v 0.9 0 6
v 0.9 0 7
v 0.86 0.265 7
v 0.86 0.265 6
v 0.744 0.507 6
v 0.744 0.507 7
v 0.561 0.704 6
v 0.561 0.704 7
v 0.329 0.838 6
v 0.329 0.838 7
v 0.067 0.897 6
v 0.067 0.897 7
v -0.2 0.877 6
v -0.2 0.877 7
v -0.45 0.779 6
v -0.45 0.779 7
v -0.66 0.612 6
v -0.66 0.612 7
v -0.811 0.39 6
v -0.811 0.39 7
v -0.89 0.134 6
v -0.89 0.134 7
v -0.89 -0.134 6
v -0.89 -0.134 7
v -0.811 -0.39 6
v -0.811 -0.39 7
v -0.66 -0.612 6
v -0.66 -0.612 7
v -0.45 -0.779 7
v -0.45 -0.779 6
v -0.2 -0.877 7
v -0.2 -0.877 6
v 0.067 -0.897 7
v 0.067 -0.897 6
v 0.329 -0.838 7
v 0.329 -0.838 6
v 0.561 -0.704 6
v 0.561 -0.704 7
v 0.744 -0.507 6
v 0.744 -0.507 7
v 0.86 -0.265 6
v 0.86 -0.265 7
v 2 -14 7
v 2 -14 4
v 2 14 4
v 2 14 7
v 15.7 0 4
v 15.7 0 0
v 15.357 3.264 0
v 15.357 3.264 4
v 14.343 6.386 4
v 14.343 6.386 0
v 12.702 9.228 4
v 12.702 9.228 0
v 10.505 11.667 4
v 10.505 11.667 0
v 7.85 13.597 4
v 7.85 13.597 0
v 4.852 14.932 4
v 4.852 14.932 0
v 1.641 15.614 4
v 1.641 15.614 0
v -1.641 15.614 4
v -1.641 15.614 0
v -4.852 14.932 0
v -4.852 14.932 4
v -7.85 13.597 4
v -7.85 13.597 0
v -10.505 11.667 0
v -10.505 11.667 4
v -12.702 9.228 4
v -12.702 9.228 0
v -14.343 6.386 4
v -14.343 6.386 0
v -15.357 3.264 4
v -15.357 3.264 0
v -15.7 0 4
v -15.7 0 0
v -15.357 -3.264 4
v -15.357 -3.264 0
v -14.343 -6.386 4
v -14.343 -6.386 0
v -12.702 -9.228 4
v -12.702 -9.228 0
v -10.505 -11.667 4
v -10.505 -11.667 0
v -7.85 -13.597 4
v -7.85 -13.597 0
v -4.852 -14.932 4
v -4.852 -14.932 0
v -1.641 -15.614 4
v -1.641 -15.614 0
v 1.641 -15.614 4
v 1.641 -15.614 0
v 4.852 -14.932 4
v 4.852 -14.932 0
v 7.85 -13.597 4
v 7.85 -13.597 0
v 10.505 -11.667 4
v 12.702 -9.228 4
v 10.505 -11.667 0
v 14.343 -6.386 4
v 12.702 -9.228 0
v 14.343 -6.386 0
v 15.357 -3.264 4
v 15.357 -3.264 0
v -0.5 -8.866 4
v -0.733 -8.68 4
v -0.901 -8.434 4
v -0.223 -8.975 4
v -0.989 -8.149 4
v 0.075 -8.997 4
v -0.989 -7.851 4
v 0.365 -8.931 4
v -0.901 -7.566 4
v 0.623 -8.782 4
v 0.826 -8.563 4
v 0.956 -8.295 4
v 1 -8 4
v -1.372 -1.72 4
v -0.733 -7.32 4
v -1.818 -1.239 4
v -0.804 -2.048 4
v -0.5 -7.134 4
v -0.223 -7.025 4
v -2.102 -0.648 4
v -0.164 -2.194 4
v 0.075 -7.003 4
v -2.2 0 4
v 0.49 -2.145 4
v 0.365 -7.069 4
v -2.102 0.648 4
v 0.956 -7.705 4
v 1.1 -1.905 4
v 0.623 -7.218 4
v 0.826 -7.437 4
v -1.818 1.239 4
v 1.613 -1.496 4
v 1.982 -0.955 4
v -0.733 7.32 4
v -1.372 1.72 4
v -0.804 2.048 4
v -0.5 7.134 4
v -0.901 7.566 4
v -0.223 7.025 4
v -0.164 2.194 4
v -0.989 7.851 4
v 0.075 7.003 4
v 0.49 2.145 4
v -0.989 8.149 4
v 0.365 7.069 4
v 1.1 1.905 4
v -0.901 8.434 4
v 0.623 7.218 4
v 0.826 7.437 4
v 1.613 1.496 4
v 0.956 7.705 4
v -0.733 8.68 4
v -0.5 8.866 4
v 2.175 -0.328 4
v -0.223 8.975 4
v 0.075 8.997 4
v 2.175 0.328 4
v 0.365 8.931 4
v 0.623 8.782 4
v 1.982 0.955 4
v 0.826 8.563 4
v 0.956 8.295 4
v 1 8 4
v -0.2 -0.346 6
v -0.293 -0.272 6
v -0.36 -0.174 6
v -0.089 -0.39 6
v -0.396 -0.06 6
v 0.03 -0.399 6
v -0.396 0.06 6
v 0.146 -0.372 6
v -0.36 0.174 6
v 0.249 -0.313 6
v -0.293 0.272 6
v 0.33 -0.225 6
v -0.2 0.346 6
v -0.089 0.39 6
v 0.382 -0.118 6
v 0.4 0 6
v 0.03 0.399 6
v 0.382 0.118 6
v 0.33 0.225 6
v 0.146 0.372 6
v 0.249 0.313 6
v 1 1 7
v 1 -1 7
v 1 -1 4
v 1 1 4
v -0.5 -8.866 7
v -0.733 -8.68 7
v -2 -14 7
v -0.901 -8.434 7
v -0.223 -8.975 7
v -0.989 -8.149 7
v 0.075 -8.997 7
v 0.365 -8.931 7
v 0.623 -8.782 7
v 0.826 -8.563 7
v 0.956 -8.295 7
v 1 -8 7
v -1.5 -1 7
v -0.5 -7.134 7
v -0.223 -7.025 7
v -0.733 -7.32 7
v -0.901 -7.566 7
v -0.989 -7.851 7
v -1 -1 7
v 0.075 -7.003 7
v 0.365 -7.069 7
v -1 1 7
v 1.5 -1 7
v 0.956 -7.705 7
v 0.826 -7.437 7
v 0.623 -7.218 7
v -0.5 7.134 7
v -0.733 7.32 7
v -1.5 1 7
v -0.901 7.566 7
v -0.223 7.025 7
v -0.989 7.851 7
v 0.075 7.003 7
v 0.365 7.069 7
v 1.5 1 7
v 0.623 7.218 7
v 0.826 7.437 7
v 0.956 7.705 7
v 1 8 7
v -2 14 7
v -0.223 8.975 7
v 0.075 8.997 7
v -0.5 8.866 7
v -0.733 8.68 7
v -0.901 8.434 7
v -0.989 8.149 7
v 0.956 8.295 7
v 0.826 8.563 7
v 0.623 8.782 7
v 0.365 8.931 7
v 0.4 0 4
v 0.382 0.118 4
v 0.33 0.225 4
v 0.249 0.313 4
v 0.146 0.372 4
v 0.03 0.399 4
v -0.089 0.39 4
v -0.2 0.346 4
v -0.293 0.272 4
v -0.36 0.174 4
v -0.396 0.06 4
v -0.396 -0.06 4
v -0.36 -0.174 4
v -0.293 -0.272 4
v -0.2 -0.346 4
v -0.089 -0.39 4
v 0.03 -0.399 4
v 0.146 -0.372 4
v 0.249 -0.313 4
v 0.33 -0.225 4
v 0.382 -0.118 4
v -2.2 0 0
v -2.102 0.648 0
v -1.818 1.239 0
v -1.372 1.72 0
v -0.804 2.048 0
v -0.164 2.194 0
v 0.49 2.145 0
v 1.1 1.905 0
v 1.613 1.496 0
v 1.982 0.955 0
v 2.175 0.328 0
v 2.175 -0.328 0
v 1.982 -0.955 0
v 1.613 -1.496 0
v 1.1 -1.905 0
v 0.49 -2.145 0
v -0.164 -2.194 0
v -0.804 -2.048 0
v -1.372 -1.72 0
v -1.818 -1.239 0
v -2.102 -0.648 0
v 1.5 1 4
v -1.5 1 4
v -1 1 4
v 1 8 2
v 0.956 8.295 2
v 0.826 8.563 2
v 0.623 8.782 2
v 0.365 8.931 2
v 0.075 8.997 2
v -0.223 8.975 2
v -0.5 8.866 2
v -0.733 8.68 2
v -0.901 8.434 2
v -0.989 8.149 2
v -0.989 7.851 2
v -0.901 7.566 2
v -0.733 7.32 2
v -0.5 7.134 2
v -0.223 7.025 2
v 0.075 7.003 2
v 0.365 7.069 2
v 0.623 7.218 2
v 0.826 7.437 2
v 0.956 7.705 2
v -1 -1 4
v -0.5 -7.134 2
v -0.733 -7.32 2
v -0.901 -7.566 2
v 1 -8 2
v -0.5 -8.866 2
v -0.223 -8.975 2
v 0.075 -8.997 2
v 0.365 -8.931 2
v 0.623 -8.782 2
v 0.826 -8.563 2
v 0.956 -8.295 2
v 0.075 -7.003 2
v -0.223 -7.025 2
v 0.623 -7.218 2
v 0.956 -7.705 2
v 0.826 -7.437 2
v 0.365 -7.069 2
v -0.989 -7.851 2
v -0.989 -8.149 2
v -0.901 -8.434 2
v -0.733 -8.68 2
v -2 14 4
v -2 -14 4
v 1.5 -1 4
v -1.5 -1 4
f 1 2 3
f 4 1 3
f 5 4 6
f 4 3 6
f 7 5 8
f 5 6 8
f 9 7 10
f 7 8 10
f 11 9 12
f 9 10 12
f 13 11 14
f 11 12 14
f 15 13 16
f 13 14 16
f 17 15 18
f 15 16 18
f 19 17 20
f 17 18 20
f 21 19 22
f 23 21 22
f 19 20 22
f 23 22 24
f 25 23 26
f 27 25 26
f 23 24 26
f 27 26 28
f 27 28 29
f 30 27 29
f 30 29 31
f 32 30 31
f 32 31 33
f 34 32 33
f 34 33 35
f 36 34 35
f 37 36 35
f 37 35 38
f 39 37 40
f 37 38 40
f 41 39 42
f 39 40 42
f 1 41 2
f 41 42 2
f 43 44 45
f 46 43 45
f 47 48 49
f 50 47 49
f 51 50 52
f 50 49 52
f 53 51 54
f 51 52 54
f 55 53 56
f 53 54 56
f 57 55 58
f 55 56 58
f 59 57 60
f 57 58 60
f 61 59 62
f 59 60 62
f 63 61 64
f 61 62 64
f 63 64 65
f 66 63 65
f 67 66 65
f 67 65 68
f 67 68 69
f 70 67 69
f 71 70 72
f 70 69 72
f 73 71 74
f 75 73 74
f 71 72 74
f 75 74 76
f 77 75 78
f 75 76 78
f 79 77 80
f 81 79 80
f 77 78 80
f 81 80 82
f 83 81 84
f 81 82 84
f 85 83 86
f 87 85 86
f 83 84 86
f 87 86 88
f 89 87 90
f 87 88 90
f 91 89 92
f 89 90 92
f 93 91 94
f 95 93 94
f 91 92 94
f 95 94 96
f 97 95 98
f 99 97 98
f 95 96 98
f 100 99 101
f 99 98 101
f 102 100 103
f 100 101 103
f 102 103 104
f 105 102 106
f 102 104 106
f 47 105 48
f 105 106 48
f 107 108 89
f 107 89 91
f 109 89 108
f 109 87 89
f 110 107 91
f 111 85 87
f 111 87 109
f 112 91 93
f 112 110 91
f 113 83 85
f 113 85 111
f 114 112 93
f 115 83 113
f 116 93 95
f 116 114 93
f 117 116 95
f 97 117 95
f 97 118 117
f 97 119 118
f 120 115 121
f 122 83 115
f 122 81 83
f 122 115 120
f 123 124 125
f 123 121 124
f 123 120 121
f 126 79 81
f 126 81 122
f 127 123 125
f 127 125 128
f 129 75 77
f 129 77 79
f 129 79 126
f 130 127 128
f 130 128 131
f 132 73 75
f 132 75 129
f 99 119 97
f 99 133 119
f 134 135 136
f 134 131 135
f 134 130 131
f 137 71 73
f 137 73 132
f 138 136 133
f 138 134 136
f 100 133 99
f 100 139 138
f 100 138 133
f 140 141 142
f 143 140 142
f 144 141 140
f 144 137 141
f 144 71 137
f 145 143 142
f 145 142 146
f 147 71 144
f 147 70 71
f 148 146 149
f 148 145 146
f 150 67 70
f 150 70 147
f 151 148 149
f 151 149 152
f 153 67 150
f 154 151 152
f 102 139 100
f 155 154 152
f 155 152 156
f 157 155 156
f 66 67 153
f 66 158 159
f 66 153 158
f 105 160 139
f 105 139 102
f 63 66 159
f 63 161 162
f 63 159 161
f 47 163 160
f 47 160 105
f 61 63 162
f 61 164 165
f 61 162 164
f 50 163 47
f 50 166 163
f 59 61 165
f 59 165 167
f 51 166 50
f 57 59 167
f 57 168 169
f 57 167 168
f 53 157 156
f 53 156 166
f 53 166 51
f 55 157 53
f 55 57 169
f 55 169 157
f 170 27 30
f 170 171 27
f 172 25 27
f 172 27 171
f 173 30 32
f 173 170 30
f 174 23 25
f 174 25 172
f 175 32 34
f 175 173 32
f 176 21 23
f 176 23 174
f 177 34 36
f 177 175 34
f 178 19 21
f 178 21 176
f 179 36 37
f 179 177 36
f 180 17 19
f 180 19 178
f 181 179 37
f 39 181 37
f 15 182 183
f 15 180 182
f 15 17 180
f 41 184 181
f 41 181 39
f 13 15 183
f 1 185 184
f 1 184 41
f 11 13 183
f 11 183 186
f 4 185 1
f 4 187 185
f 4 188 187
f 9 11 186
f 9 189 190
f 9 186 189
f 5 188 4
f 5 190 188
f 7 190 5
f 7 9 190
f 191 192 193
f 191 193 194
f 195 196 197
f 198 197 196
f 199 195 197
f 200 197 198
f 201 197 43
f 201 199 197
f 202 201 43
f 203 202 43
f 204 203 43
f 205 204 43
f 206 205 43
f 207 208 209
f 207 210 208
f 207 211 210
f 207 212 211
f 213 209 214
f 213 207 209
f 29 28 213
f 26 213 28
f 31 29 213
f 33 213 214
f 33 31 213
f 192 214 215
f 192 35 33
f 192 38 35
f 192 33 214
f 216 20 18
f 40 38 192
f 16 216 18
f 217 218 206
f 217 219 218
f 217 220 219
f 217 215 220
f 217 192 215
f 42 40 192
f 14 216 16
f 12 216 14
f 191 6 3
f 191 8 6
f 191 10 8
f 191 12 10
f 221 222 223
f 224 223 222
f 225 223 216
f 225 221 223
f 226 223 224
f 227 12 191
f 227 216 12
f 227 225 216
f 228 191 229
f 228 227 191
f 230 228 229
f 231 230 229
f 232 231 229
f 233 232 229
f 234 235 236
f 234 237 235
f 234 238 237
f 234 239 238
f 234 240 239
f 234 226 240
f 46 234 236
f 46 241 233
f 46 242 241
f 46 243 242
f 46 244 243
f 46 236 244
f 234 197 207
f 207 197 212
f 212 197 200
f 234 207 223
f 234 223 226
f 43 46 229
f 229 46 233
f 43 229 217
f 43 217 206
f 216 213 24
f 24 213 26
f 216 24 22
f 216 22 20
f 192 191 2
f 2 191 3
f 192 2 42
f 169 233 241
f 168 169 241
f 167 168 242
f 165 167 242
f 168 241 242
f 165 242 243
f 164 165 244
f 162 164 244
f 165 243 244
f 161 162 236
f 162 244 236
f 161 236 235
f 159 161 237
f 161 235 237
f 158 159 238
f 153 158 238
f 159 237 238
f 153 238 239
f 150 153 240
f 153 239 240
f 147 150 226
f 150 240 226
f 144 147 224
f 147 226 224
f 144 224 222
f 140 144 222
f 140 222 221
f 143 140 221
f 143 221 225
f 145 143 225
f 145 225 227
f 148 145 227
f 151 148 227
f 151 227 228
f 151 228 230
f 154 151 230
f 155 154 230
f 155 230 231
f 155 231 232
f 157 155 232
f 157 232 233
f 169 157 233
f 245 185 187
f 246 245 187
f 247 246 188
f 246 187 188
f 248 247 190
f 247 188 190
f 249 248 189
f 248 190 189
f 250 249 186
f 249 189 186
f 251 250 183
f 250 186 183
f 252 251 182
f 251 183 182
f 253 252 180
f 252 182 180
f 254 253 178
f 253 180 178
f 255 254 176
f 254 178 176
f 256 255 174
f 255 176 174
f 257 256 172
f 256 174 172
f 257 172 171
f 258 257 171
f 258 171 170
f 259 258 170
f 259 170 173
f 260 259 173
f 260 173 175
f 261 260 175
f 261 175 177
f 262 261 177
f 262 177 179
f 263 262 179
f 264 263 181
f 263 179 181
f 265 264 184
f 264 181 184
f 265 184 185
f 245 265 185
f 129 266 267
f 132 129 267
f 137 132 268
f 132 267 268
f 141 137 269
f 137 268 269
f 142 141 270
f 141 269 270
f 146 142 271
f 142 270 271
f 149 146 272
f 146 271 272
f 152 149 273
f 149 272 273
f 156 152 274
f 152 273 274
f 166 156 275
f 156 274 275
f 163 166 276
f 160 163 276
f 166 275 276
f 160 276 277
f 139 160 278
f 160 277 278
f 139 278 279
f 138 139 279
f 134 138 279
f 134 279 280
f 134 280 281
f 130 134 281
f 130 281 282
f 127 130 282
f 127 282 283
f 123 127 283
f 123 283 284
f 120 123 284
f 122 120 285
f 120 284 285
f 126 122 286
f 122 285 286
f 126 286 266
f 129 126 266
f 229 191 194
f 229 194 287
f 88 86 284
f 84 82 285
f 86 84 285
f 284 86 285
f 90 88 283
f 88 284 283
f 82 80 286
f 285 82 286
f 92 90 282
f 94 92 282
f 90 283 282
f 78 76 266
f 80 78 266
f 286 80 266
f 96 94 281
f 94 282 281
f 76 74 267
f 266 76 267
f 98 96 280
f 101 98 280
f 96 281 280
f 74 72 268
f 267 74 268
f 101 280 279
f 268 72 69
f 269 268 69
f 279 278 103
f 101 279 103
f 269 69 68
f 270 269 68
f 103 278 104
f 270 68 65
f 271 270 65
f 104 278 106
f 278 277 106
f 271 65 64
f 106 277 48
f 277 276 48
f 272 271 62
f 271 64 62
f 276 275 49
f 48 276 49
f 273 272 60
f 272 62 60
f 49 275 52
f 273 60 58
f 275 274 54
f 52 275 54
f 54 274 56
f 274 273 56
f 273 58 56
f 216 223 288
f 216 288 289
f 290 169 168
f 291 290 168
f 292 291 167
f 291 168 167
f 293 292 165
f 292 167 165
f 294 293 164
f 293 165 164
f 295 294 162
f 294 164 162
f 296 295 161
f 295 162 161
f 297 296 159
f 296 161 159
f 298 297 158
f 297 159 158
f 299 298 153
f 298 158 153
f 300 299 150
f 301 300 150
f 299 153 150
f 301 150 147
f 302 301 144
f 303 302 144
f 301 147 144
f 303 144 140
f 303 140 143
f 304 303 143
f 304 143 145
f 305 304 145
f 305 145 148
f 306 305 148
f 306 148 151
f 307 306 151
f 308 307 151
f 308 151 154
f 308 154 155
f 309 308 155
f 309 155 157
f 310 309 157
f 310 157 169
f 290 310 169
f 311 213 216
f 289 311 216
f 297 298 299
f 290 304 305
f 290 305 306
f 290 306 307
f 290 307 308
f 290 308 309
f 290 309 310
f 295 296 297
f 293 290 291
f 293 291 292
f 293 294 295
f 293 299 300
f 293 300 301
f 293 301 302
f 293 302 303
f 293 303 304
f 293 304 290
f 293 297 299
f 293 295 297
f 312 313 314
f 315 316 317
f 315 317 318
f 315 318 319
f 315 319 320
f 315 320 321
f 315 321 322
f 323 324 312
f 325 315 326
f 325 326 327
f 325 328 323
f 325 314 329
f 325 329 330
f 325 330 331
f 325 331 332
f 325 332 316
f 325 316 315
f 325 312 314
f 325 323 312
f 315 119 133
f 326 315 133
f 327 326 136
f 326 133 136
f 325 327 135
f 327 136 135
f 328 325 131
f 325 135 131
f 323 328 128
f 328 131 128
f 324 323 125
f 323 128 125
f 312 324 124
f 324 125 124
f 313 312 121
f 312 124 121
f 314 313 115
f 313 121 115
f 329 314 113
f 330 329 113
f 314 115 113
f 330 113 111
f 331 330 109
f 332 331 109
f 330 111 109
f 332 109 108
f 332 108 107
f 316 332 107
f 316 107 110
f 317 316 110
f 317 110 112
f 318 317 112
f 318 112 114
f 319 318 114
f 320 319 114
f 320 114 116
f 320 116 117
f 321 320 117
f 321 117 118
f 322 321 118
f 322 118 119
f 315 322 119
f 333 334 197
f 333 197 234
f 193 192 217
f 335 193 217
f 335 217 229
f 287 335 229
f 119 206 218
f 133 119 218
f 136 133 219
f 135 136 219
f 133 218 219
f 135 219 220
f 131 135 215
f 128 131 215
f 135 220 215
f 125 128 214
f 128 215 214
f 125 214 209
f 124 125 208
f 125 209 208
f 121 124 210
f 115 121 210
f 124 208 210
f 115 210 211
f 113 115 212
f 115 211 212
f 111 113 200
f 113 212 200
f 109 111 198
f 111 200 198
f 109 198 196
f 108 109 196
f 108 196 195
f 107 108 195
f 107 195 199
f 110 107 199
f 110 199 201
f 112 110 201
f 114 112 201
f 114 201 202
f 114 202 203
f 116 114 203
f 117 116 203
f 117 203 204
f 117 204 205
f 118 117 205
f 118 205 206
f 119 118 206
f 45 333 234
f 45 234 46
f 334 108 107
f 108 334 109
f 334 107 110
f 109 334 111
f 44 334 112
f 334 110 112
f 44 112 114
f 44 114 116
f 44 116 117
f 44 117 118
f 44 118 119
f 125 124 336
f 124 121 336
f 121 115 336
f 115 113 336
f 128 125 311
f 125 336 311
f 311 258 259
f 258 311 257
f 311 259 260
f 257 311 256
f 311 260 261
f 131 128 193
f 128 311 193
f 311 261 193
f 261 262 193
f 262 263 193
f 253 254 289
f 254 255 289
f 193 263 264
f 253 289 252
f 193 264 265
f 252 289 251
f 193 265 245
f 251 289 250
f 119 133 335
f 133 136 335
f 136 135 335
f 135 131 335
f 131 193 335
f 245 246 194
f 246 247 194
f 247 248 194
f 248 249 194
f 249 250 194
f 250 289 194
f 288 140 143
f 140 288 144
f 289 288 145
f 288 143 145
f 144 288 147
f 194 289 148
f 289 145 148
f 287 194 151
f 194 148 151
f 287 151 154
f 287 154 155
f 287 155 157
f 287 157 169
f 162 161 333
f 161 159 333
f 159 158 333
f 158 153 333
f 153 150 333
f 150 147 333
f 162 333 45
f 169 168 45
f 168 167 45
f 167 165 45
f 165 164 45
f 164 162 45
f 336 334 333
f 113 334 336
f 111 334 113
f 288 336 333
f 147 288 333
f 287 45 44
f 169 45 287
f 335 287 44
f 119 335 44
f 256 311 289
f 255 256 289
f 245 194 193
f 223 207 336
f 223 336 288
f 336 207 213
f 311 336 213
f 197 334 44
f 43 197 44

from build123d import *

# Parameters (mm, degrees)
SKETCH_1_R          = 15.7
EXTRUDE_1_DEPTH     = 4
SKETCH_2_R          = 2.2
CUT_EXTRUDE_1_DEPTH = 4
SKETCH_3_W          = 4
SKETCH_3_H          = 28
EXTRUDE_2_DEPTH     = 3
SKETCH_5_R          = 0.9
CUT_EXTRUDE_3_DEPTH = 1
SKETCH_6_R          = 0.4
CUT_EXTRUDE_4_DEPTH = 2
SKETCH_7_W          = 0.5
SKETCH_7_H          = 2
CUT_EXTRUDE_5_DEPTH = 3
SKETCH_8_R          = 1
CUT_EXTRUDE_6_DEPTH = 5


with BuildPart() as part:
    # 草图1 → 凸台-拉伸1 (new body)
    with BuildSketch(Plane.XY):
        Circle(SKETCH_1_R)
    extrude(amount=EXTRUDE_1_DEPTH)

    # 草图2 → 切除-拉伸1 (cut)
    with BuildSketch(Plane(origin=(0, 0, 0), x_dir=(-1, 0, 0), z_dir=(0, 0, -1))):
        Circle(SKETCH_2_R)
    extrude(amount=-CUT_EXTRUDE_1_DEPTH, mode=Mode.SUBTRACT)


with BuildPart() as body_2:
    # 草图3 → 凸台-拉伸2 (new body)
    with BuildSketch(Plane.XY.offset(4)):
        Rectangle(SKETCH_3_W, SKETCH_3_H)
    extrude(amount=EXTRUDE_2_DEPTH)

    # 草图5 → 切除-拉伸3 (cut)
    with BuildSketch(Plane.XY.offset(7)):
        Circle(SKETCH_5_R)
    extrude(amount=-CUT_EXTRUDE_3_DEPTH, mode=Mode.SUBTRACT)

    # 草图6 → 切除-拉伸4 (cut)
    with BuildSketch(Plane.XY.offset(6)):
        Circle(SKETCH_6_R)
    extrude(amount=-CUT_EXTRUDE_4_DEPTH, mode=Mode.SUBTRACT)

    # 草图7 → 切除-拉伸5 (cut)
    with BuildSketch(Plane.XY.offset(7)):
        with Locations((1.25, 0)):
            Rectangle(SKETCH_7_W, SKETCH_7_H)
        with Locations((-1.25, 0)):
            Rectangle(SKETCH_7_W, SKETCH_7_H)
    extrude(amount=-CUT_EXTRUDE_5_DEPTH, mode=Mode.SUBTRACT)


with BuildPart() as cut_extrude_6_tool:
    # 草图8 → 切除-拉伸6 (new body)
    with BuildSketch(Plane.XY.offset(7)):
        with Locations((0, 8)):
            Circle(SKETCH_8_R)
        with Locations((0, -8)):
            Circle(SKETCH_8_R)
    extrude(amount=-CUT_EXTRUDE_6_DEPTH)


with BuildPart() as part_1:
    add(part.part)

    # 切除-拉伸6: cut by cut_extrude_6_tool
    add(cut_extrude_6_tool.part, mode=Mode.SUBTRACT)


with BuildPart() as body_2_1:
    add(body_2.part)

    # 切除-拉伸6: cut by cut_extrude_6_tool
    add(cut_extrude_6_tool.part, mode=Mode.SUBTRACT)


solid = Compound([part_1.part, body_2_1.part])
